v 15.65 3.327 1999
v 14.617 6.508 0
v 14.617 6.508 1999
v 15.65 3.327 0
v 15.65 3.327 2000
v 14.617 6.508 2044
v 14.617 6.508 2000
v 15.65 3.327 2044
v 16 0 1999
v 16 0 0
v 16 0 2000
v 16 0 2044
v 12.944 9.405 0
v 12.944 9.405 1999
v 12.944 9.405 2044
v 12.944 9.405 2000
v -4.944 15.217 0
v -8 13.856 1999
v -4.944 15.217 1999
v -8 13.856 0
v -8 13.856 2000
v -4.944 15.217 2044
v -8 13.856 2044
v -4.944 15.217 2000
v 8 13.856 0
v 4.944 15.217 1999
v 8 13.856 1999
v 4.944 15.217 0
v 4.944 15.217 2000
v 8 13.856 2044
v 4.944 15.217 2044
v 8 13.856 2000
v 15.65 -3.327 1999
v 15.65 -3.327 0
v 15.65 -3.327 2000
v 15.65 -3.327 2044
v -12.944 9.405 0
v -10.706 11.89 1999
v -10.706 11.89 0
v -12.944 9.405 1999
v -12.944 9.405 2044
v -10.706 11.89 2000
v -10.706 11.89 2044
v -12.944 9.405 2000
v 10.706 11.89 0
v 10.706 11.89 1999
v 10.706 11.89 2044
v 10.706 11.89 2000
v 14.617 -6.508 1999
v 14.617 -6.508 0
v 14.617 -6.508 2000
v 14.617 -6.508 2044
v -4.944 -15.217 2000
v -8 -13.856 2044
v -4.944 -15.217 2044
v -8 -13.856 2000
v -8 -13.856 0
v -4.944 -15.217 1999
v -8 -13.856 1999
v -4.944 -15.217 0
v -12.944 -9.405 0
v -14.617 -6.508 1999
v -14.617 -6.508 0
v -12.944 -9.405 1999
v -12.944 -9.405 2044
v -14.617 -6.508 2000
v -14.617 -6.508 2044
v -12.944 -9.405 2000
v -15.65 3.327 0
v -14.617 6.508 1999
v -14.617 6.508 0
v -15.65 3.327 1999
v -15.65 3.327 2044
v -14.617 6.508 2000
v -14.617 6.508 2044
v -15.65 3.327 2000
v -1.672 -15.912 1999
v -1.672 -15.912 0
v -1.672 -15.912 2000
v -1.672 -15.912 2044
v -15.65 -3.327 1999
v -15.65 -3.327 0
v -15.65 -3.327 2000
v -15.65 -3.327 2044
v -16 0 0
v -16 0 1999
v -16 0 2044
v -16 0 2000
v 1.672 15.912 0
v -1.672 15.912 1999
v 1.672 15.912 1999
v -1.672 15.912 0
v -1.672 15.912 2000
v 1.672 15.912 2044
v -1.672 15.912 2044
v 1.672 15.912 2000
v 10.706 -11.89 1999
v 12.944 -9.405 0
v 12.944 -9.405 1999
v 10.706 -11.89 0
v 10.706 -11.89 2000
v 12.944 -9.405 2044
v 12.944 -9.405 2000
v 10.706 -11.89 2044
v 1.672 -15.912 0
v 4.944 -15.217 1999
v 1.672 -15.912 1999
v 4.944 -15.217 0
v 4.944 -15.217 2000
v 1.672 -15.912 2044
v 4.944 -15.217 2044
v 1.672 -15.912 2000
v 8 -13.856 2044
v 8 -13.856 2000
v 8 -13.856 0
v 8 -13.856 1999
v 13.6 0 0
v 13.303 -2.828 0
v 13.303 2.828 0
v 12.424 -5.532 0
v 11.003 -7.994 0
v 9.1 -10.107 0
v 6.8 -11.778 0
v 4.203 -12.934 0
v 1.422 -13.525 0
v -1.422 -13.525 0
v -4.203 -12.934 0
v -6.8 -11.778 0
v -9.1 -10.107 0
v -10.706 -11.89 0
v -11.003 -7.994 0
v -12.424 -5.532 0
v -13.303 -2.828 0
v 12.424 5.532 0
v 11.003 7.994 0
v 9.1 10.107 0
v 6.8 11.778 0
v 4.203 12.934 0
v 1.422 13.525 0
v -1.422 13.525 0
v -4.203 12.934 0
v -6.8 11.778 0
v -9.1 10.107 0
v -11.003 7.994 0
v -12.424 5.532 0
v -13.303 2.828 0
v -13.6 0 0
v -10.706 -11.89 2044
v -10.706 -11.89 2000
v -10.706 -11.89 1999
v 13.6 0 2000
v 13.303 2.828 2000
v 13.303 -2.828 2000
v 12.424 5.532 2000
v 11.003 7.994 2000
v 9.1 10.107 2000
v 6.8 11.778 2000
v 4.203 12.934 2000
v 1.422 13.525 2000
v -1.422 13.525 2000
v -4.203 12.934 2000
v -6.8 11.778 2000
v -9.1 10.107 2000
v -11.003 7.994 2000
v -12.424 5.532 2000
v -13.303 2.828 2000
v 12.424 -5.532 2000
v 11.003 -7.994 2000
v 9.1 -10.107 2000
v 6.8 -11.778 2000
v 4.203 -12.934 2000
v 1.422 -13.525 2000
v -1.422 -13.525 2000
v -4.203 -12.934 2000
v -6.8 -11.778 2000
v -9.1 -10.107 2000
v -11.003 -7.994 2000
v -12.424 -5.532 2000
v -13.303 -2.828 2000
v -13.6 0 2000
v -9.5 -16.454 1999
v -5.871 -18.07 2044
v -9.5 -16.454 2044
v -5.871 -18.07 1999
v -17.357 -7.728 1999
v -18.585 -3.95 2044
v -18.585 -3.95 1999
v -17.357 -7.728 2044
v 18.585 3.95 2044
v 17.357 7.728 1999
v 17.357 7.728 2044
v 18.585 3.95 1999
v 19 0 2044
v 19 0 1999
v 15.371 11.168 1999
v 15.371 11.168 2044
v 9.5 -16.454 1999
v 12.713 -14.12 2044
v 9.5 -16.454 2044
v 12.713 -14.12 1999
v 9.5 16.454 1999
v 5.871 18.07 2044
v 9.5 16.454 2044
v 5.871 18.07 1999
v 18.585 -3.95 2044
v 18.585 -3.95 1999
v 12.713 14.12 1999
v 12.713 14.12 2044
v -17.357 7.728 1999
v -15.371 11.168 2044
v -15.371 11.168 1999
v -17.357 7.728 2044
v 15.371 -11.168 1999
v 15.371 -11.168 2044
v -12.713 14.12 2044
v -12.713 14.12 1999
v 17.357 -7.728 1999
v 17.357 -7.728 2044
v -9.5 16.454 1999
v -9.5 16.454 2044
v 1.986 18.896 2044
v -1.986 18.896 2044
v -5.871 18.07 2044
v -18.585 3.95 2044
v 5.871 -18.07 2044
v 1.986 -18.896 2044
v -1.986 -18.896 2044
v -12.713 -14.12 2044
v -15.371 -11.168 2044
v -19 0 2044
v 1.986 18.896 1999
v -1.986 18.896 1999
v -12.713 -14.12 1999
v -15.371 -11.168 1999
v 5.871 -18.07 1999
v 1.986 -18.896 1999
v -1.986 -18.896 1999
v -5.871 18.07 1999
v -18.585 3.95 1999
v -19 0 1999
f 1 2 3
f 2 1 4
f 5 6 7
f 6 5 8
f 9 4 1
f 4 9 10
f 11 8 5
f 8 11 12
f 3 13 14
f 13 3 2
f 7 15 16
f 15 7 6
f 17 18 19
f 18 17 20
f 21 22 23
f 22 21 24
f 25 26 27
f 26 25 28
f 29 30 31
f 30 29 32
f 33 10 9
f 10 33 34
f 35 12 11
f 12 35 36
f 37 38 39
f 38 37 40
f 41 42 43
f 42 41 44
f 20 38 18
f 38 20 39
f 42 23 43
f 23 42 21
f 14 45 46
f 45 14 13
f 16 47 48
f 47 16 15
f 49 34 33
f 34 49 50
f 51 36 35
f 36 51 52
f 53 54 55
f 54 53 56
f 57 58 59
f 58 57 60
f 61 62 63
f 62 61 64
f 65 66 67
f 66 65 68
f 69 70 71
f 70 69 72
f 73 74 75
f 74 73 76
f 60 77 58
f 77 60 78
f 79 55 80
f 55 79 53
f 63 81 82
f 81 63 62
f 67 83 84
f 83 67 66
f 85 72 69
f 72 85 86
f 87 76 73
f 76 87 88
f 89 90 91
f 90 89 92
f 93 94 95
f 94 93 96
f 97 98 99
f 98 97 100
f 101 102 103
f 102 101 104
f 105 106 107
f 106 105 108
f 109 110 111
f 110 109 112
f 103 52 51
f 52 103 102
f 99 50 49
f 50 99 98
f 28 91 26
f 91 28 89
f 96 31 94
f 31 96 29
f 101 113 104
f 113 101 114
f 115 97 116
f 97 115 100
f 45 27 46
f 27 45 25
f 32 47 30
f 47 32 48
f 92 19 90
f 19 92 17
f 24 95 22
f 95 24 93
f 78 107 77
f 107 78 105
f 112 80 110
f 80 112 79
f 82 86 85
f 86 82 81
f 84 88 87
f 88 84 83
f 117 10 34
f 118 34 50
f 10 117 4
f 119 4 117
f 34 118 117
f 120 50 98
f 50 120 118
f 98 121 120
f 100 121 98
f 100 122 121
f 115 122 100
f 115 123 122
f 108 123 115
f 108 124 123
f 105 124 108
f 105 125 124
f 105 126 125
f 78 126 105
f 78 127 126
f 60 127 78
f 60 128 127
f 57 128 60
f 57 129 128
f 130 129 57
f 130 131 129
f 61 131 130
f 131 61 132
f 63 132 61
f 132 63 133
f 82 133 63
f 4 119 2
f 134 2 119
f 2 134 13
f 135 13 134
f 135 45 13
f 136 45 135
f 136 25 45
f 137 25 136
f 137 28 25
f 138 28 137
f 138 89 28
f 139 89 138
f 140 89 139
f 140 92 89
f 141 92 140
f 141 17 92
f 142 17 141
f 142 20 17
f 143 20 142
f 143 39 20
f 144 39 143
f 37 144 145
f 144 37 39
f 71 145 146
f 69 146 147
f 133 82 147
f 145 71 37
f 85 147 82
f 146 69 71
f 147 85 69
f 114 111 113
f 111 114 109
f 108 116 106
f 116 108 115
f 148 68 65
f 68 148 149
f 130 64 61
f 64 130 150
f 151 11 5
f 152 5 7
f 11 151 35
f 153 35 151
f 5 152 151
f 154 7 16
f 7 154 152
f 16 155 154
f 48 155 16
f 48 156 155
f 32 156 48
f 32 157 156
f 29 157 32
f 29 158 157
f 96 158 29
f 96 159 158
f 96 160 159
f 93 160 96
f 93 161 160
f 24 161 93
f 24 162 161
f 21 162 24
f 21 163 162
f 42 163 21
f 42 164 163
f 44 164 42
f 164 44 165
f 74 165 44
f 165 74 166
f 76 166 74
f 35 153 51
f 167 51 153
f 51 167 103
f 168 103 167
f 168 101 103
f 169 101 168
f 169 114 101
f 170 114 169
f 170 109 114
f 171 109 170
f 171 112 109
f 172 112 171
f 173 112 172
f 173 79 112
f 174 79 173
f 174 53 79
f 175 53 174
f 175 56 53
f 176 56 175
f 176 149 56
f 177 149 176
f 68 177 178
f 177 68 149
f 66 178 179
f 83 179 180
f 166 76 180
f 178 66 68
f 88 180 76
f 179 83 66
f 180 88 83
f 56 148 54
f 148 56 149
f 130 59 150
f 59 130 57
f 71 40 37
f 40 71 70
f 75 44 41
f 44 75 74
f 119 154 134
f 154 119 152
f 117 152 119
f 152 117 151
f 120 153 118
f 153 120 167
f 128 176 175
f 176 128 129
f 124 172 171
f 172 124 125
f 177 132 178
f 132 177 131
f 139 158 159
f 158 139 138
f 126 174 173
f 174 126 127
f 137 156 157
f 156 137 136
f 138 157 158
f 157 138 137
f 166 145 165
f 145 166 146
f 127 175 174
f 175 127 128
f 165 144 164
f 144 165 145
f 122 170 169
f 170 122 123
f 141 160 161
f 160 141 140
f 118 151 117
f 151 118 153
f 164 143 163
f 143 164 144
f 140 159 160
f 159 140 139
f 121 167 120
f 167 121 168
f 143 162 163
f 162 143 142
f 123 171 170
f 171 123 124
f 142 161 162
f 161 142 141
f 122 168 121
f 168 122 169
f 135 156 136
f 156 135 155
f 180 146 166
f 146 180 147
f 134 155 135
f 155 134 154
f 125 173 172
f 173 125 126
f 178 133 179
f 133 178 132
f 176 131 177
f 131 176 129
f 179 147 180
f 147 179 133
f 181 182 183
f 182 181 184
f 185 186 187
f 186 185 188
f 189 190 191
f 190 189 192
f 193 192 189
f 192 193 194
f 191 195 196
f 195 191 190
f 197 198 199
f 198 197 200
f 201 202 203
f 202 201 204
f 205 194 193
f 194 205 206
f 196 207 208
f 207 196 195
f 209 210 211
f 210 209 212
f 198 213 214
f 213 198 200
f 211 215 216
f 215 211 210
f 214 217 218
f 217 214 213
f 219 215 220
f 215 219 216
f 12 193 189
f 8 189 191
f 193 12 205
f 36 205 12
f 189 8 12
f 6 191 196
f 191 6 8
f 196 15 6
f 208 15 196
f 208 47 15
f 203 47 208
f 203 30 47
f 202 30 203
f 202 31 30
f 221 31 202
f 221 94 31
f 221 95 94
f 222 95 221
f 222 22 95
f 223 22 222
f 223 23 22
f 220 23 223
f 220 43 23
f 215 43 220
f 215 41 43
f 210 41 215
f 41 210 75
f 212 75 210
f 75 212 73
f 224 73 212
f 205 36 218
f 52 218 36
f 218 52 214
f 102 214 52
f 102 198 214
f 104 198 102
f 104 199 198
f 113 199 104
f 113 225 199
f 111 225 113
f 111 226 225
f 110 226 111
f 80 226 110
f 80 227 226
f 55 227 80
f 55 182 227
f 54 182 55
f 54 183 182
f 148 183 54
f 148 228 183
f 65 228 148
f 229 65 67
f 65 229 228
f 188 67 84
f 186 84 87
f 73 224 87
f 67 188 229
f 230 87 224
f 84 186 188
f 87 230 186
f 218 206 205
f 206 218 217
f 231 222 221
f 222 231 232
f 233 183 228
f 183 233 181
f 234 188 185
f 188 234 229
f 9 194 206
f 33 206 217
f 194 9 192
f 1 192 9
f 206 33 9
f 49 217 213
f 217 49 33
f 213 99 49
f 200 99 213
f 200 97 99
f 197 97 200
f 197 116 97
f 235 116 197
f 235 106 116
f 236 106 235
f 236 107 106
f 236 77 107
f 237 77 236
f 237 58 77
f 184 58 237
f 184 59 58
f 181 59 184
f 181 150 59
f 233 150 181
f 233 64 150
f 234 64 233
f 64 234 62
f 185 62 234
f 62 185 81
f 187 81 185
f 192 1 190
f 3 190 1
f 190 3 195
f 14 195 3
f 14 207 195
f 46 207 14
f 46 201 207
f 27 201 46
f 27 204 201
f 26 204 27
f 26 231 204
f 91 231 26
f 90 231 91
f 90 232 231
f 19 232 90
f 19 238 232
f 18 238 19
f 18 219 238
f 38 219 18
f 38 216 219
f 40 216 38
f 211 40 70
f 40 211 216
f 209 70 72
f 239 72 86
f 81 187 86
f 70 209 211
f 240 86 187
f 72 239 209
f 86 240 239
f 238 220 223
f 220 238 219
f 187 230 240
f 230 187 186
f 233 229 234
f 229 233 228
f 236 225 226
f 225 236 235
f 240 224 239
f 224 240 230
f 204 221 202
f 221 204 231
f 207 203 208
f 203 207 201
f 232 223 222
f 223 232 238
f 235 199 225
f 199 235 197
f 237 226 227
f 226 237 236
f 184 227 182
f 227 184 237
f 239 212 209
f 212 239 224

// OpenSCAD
// Parameters
pipe_standard = 1; //[1:1:1]
nominal_size_mm = 32; //[16:64:1]
length_mm = 2000; //[1000:4000:10]
center = 0; //[0:1:1]
od_mm = 32; //[16:64:1]
wall_mm = 2.4; //[1.2:4.8:0.1]
id_mm = 27.2; //[10:60:0.1]
fitting_len_mm = 45; //[25:90:1]
fitting_od_mm = 38; //[30:60:1]
fitting_wall_mm = 3; //[1.5:6:0.1]
overlap_mm = 1; //[0.5:2:0.1]

// HT Pipe - complete geometry
module ht_pipe() {
  color([0.85, 0.85, 0.8]) {
    // Outer pipe
    difference() {
      cylinder(h=length_mm, r=od_mm/2, center=false);
      // Hollow bore
      translate([0, 0, 0])
        cylinder(h=length_mm + fitting_len_mm, r=id_mm/2, center=false);
    }
    
    // End fitting
    translate([0, 0, length_mm - overlap_mm])
      difference() {
        cylinder(h=fitting_len_mm, r=fitting_od_mm/2, center=false);
        translate([0, 0, 0])
          cylinder(h=fitting_len_mm + overlap_mm, r=fitting_od_mm/2 - fitting_wall_mm, center=false);
      }
  }
}

// Assembly
module assembly() {
  ht_pipe();
}

assembly();
